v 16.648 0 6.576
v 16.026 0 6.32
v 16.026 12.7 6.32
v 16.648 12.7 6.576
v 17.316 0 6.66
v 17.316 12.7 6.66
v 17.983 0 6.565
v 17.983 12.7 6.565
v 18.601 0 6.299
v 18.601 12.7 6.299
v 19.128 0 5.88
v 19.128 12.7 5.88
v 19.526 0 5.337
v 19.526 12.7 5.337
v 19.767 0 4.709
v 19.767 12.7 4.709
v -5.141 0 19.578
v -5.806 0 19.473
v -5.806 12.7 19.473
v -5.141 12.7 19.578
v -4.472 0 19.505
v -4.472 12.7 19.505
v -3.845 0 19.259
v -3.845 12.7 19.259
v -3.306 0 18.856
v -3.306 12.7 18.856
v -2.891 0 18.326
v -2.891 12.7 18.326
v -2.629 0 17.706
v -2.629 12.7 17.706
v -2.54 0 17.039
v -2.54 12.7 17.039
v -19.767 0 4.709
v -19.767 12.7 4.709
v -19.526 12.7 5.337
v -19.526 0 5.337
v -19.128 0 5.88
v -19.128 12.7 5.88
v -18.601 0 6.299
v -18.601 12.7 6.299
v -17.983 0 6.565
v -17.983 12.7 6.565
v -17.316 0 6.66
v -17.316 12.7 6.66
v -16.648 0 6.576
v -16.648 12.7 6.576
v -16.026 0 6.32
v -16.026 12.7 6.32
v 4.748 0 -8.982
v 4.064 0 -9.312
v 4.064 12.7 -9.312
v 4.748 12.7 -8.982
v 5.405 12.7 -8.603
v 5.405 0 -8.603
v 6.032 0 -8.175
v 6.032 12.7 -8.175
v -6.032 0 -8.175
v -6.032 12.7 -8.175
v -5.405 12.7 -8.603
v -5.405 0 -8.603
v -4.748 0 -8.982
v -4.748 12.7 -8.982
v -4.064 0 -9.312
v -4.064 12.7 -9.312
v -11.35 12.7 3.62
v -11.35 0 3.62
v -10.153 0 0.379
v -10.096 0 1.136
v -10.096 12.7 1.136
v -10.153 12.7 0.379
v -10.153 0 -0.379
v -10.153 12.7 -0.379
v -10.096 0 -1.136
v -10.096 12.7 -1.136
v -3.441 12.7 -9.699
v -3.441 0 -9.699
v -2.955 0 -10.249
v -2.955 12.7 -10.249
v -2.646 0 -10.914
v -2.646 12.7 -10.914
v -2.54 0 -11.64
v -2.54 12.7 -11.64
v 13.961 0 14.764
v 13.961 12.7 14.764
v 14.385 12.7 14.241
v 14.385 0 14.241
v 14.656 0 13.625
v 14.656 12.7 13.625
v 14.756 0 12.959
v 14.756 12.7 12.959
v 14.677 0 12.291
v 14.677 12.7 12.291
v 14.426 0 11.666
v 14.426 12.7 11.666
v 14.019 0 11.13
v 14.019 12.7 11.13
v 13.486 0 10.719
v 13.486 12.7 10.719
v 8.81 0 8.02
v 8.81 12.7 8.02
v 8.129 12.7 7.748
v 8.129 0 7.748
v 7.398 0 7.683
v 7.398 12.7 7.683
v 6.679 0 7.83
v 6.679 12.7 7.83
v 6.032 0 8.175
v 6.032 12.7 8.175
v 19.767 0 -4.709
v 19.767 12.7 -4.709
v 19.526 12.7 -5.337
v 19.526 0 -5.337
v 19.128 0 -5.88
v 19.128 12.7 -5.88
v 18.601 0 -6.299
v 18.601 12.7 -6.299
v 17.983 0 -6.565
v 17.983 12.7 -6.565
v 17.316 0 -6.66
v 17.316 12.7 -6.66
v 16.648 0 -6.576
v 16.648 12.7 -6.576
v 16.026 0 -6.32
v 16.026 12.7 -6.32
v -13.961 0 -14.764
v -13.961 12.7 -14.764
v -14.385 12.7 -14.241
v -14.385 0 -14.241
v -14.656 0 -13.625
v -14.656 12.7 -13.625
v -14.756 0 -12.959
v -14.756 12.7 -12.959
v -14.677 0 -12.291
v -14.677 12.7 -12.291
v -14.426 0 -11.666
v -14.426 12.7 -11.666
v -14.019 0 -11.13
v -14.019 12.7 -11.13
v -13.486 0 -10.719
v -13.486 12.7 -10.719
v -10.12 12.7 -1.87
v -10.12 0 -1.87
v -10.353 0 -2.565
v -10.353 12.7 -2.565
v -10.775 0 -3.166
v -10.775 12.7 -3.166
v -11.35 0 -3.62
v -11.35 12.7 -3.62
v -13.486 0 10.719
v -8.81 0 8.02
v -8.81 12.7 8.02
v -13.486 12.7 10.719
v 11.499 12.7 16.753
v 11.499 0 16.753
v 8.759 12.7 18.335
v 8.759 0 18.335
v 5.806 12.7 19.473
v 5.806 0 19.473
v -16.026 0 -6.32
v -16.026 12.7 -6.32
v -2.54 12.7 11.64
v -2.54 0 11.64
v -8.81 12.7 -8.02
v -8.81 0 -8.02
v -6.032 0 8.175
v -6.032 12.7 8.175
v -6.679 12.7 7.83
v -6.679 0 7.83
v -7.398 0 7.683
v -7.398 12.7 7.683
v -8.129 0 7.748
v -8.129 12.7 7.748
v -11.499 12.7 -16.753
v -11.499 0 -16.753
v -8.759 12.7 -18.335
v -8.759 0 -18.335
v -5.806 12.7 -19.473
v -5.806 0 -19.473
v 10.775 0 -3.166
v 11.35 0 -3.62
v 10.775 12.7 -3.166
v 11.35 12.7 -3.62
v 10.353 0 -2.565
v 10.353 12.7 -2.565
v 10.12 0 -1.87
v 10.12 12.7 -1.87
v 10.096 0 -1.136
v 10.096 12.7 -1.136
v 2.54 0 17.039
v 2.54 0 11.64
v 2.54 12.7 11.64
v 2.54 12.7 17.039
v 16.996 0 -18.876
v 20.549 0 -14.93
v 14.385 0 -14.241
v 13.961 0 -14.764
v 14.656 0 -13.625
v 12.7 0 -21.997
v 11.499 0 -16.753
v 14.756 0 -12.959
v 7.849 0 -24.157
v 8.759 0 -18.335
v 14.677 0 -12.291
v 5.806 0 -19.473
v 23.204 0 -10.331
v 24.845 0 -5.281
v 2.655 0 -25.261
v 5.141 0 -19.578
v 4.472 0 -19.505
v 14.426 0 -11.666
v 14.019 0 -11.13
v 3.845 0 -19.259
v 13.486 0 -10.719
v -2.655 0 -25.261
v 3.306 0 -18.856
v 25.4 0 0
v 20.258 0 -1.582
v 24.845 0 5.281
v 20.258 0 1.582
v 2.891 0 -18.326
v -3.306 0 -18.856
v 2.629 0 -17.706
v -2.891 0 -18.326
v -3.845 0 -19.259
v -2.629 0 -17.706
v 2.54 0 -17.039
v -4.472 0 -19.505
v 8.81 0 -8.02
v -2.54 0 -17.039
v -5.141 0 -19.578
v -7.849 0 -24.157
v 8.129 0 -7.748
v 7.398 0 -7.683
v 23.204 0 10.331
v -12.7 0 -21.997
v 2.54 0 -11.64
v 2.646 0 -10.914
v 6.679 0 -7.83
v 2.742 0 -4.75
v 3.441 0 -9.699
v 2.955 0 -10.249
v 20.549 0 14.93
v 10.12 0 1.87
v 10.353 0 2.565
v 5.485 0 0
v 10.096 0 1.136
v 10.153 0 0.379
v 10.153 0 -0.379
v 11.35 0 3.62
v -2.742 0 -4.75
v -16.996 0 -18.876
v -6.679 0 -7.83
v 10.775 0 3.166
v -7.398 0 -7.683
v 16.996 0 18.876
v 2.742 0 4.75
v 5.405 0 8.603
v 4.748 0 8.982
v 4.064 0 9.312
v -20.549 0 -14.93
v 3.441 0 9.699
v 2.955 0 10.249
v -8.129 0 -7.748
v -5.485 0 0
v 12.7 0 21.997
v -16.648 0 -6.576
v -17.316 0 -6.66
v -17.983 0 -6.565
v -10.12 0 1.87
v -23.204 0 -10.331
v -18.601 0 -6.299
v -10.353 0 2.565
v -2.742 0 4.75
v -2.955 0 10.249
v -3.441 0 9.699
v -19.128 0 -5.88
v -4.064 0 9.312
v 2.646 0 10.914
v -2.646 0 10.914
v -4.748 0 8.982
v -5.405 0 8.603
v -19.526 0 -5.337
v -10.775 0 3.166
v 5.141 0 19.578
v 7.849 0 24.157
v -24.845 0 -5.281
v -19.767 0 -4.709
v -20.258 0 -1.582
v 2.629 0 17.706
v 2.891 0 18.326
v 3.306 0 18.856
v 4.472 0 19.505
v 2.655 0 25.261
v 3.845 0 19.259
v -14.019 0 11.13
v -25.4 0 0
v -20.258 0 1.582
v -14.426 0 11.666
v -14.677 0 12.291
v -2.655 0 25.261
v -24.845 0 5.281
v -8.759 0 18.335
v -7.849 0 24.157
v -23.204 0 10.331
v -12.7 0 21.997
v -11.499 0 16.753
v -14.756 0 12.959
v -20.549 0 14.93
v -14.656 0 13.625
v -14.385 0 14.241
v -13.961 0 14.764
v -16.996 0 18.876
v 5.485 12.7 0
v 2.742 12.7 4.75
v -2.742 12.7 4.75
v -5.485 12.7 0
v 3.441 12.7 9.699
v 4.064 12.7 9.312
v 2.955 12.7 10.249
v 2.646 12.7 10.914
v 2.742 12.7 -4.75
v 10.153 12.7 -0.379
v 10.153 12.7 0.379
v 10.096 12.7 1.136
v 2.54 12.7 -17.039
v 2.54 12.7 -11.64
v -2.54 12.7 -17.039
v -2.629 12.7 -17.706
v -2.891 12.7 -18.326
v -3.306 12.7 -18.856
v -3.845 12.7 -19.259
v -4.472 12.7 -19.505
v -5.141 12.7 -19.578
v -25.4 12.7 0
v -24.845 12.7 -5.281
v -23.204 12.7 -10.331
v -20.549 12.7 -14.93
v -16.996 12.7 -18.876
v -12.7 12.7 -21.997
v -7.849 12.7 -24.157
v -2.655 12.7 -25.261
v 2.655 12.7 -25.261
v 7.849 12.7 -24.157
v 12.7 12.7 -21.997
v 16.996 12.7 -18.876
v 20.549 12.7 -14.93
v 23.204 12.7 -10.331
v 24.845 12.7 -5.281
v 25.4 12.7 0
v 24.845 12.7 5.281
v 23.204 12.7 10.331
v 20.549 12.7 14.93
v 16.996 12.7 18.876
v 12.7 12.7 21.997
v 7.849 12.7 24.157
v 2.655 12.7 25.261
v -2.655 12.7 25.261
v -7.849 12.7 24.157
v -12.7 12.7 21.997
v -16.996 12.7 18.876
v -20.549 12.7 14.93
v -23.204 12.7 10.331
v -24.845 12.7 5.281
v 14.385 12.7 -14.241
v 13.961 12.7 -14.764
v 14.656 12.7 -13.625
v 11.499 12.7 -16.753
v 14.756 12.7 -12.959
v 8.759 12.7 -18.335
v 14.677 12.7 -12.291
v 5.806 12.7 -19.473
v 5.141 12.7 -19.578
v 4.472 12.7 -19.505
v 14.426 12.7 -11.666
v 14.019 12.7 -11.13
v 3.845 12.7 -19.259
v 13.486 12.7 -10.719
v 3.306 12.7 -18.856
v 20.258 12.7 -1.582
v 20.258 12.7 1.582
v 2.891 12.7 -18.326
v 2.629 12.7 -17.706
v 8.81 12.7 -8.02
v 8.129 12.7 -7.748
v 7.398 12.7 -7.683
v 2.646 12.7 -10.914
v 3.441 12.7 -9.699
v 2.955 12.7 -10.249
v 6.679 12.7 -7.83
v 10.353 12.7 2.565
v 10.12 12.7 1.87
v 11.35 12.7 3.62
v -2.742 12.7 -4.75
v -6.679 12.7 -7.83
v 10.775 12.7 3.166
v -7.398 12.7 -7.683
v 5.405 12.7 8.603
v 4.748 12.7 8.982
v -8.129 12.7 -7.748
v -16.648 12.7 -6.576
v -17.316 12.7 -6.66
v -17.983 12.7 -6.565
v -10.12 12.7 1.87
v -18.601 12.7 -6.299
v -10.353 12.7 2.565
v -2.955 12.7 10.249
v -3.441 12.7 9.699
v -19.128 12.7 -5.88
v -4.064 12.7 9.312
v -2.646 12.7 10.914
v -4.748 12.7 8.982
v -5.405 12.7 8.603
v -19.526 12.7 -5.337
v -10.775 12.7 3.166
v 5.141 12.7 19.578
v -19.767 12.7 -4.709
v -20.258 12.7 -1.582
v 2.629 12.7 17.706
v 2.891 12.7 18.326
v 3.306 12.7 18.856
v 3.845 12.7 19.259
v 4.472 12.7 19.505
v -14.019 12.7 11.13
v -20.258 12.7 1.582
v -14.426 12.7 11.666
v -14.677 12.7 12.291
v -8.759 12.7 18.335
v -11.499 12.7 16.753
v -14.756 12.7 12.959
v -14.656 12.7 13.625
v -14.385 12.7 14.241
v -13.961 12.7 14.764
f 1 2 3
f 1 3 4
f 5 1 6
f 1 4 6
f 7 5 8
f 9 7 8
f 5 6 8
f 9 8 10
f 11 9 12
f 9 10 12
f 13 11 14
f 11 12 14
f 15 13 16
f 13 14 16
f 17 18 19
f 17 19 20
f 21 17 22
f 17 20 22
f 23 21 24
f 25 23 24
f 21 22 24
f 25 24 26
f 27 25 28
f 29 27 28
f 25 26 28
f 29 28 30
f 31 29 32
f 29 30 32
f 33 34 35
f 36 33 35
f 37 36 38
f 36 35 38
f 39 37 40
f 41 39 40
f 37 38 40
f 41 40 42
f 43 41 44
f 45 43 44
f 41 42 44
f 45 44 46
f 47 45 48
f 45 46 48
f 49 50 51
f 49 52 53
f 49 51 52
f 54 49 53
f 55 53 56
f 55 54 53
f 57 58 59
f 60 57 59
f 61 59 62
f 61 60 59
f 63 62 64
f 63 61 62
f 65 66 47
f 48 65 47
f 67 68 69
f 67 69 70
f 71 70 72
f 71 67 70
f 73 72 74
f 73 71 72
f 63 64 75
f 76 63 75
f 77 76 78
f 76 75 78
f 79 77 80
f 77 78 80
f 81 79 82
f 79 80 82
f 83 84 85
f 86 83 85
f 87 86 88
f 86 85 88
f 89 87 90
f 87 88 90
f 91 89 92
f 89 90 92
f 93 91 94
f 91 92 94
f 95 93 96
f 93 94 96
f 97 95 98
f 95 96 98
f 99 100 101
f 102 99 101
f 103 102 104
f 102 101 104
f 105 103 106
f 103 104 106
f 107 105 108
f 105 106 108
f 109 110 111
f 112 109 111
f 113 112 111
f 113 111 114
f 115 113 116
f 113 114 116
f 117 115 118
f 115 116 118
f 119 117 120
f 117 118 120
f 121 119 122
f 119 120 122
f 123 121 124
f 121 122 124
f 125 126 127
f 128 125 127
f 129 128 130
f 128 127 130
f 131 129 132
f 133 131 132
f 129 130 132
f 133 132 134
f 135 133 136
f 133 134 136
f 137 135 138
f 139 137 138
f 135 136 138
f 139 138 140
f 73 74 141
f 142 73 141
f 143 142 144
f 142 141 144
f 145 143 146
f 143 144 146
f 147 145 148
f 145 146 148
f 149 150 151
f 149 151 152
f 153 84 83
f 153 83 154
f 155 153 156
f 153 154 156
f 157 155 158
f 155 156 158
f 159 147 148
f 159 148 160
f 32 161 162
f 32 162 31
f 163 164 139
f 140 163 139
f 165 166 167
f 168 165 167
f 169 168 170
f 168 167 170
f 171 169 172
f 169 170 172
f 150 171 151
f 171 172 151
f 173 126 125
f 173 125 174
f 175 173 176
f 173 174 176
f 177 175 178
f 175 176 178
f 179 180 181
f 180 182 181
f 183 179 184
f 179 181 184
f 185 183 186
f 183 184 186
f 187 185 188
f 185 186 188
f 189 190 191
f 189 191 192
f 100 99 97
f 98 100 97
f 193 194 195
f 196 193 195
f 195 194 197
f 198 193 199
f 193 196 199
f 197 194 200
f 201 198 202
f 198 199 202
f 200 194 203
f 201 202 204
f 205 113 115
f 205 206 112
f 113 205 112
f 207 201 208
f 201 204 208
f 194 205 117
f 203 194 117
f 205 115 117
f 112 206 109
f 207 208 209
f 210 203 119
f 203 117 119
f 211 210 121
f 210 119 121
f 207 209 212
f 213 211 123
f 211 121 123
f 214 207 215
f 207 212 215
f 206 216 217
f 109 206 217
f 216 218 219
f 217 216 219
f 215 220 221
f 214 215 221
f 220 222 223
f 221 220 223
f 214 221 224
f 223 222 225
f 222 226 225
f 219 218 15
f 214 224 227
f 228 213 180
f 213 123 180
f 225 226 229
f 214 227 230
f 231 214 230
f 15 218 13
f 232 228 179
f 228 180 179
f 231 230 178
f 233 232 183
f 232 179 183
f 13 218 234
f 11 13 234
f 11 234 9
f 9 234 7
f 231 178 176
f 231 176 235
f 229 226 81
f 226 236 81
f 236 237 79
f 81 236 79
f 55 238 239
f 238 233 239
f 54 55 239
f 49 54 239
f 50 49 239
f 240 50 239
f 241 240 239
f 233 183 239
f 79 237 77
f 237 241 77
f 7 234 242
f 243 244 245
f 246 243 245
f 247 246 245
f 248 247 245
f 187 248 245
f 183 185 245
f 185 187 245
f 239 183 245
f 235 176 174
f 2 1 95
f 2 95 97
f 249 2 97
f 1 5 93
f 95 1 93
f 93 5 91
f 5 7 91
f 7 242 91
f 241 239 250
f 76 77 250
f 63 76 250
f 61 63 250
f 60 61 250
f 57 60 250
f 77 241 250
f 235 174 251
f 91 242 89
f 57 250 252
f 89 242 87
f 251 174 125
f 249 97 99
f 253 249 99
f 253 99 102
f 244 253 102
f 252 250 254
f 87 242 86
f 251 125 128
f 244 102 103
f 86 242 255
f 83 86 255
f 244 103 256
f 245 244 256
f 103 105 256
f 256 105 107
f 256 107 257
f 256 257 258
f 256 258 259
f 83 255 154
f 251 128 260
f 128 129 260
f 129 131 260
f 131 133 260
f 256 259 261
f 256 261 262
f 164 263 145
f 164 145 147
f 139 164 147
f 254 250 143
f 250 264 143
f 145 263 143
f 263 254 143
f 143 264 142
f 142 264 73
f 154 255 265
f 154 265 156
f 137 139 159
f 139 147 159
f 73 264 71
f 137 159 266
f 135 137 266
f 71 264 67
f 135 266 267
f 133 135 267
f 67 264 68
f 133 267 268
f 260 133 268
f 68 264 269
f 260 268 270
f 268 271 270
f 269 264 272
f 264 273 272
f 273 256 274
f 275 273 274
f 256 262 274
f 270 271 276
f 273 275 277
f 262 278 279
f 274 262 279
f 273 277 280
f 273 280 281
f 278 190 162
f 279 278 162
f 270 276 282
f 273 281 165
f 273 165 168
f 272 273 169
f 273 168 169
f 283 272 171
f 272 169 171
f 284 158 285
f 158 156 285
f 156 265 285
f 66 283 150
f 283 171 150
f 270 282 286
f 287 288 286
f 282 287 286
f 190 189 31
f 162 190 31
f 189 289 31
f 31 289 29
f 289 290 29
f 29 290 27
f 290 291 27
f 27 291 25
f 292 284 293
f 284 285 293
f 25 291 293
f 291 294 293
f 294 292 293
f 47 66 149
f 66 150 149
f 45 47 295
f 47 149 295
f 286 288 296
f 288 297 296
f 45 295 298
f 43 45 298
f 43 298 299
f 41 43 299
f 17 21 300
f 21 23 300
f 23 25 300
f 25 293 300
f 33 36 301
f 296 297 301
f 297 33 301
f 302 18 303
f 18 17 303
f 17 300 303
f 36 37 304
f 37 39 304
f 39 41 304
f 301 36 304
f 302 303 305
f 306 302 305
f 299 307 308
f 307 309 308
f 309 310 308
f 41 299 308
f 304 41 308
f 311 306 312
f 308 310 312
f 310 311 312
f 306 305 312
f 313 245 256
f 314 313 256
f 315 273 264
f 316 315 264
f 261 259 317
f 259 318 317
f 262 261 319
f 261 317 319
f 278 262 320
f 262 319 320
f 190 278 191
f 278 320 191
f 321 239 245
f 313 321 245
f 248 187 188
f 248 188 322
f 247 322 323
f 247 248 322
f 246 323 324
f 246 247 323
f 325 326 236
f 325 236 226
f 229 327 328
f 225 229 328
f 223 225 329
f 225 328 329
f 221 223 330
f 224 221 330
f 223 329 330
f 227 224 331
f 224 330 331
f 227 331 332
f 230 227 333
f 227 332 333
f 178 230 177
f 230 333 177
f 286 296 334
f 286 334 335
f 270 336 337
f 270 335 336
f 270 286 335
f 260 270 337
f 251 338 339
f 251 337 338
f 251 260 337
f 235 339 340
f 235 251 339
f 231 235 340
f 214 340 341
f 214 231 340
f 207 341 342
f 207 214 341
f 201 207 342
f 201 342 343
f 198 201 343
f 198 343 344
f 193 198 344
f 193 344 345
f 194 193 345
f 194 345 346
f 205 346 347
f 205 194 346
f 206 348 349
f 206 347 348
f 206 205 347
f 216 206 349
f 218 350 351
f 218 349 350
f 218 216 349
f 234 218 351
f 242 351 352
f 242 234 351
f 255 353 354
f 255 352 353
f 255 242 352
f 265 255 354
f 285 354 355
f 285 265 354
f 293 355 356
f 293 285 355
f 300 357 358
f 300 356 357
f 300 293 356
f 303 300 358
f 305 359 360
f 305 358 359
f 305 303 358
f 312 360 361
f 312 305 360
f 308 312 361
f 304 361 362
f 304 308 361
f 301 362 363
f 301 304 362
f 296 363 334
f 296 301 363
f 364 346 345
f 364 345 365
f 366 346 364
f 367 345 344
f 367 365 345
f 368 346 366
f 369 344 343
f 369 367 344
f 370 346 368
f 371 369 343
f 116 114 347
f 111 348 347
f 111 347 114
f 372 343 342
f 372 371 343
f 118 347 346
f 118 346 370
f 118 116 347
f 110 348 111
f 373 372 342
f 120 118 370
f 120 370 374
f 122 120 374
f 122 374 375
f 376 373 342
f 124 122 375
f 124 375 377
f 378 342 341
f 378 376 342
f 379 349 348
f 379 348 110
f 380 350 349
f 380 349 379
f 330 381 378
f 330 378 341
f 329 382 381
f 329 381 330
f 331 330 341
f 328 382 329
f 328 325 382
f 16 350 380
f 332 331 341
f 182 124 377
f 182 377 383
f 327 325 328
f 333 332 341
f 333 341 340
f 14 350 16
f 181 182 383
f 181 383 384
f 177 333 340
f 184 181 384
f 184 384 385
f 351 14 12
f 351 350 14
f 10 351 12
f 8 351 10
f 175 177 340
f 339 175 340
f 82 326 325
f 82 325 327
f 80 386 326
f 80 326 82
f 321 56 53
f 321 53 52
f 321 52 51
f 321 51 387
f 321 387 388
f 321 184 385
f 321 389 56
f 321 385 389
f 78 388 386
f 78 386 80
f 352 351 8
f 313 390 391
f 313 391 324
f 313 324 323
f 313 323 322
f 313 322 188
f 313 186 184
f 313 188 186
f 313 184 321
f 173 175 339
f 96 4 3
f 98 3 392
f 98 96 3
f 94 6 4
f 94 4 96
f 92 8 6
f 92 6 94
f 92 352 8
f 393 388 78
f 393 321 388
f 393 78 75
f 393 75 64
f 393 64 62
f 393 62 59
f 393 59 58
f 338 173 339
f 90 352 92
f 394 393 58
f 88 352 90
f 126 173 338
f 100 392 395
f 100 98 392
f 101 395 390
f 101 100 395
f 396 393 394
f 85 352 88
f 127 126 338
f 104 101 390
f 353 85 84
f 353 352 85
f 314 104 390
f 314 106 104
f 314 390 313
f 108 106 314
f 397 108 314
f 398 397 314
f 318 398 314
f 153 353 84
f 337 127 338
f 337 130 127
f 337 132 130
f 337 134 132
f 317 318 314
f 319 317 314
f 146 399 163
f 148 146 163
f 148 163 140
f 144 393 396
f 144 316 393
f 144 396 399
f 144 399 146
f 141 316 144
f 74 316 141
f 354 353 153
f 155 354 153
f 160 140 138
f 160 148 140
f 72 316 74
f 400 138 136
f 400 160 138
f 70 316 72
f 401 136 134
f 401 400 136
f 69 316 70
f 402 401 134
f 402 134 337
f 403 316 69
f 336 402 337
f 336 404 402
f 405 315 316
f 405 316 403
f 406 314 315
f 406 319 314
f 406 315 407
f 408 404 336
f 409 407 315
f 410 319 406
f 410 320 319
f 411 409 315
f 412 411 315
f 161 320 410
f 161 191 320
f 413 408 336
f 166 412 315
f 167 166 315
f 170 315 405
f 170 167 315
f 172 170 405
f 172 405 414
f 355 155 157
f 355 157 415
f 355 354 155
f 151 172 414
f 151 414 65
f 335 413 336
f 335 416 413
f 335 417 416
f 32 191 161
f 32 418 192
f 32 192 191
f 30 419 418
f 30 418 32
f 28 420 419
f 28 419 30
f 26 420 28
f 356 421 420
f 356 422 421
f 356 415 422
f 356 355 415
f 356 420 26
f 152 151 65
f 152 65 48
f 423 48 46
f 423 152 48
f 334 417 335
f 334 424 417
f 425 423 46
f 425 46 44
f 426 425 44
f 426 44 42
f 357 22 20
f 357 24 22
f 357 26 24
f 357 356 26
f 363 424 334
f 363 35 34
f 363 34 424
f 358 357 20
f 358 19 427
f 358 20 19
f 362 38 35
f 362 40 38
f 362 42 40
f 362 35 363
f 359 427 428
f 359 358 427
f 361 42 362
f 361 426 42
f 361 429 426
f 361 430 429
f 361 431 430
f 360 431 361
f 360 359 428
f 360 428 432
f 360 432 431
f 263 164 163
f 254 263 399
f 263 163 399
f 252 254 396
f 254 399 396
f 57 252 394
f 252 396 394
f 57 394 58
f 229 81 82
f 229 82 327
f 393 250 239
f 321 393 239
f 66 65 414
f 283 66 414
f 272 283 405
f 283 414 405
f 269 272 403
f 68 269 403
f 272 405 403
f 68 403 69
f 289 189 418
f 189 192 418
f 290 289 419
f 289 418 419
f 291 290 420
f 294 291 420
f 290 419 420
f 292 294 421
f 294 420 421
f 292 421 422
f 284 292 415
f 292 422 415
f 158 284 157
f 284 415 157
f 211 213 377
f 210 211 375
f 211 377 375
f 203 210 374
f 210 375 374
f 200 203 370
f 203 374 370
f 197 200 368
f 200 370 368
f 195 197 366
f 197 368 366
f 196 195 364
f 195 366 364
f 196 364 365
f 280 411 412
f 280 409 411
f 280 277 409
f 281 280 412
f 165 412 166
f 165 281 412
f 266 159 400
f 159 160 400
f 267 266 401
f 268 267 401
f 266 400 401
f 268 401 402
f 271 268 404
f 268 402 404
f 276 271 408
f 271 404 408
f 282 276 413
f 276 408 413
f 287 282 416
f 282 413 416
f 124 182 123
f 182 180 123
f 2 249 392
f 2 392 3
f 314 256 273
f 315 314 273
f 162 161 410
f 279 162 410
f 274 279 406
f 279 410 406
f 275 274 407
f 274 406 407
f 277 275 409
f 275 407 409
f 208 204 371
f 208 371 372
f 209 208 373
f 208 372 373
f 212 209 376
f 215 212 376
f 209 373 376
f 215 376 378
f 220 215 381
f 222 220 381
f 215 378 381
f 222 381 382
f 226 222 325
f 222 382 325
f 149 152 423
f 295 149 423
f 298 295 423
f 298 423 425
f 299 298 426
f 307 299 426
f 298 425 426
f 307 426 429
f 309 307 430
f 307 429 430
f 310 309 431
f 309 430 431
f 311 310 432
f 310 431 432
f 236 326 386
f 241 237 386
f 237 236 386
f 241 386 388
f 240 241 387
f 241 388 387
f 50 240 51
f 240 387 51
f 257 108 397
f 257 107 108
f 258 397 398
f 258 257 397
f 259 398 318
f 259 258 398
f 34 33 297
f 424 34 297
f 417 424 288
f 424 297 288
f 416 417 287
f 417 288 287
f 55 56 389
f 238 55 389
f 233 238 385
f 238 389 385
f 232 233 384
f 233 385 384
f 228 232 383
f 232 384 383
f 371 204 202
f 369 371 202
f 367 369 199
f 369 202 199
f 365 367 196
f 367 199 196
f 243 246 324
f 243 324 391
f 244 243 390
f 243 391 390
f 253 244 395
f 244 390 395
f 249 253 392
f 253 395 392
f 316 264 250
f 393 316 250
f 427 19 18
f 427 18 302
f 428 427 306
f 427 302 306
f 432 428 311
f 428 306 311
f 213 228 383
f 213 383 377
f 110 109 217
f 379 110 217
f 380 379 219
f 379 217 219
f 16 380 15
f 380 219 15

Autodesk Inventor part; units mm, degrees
ref_plane "YZ Plane" through (0, 0, 0) normal (1, 0, 0) x (0, 1, 0)
ref_plane "XZ Plane" through (0, 0, 0) normal (0, 1, 0) x (-1, 0, 0)
ref_plane "XY Plane" through (0, 0, 0) normal (0, 0, 1) x (1, 0, 0)
sketch "Sketch1" plane through (0, 0, 0) normal (0, 1, 0) x (-1, 0, 0)
  circle A0 centre (0, 0) radius 25.4
  line L0 (-2.7424, 4.75) -> (2.7424, 4.75)
  line L1 (2.7424, 4.75) -> (5.4848, 0)
  line L2 (5.4848, 0) -> (2.7424, -4.75)
  line L3 (2.7424, -4.75) -> (-2.7424, -4.75)
  line L4 (-2.7424, -4.75) -> (-5.4848, 0)
  line L5 (-5.4848, 0) -> (-2.7424, 4.75)
  line L6 (2.54, -9.8374) -> (2.54, -20.1606)
  line L7 (-2.54, -9.8374) -> (-2.54, -20.1606)
  line L8 (0, -11.1125) -> (0, -22.225) construction
  line L9 (9.7894, -2.719) -> (18.7296, -7.8806)
  line L10 (7.2494, -7.1184) -> (16.1896, -12.28)
  line L11 (7.2494, 7.1184) -> (16.1896, 12.28)
  line L12 (9.7894, 2.719) -> (18.7296, 7.8806)
  line L13 (-2.54, 9.8374) -> (-2.54, 20.1606)
  line L14 (2.54, 9.8374) -> (2.54, 20.1606)
  line L15 (-9.7894, 2.719) -> (-18.7296, 7.8806)
  line L16 (-7.2494, 7.1184) -> (-16.1896, 12.28)
  line L17 (-7.2494, -7.1184) -> (-16.1896, -12.28)
  line L18 (-9.7894, -2.719) -> (-18.7296, -7.8806)
  arc A1 (9.7894, -2.719) -> (9.7894, 2.719) centre (0, 0) ccw
  arc A2 (7.2494, 7.1184) -> (2.54, 9.8374) centre (0, 0) ccw
  arc A3 (-2.54, 9.8374) -> (-7.2494, 7.1184) centre (0, 0) ccw
  arc A4 (-9.7894, 2.719) -> (-9.7894, -2.719) centre (0, 0) ccw
  arc A5 (-16.1896, -12.28) -> (-2.54, -20.1606) centre (0, 0) ccw
  arc A6 (2.54, -20.1606) -> (16.1896, -12.28) centre (0, 0) ccw
  arc A7 (18.7296, -7.8806) -> (18.7296, 7.8806) centre (0, 0) ccw
  arc A8 (16.1896, 12.28) -> (2.54, 20.1606) centre (0, 0) ccw
  arc A9 (-2.54, 20.1606) -> (-16.1896, 12.28) centre (0, 0) ccw
  arc A10 (-18.7296, 7.8806) -> (-18.7296, -7.8806) centre (0, 0) ccw
  arc A11 (-7.2494, -7.1184) -> (-2.54, -9.8374) centre (0, 0) ccw
  arc A12 (2.54, -9.8374) -> (7.2494, -7.1184) centre (0, 0) ccw
  dimension "d1" = 9.5
  dimension "d4" = 5.08
  dimension "d7" = 360
  dimension "d9" = 20.32
  dimension "d10" = 10.16
  dimension "d11" = 25.4
extrude "Extrusion1" add sketch "Sketch1" along normal blind 12.7
fillet "Fillet1" radius 2.54 4 edges at (16.1896, 6.35, 12.28) (7.2494, 6.35, 7.1184) (2.54, 6.35, 9.8374) (2.54, 6.35, 20.1606)
pattern_circular "Circular Pattern1" count 6 over 360 about axis through (0, 0, 0) along (0, 1, 0) of "Fillet1"
properties part number "2in mould"
